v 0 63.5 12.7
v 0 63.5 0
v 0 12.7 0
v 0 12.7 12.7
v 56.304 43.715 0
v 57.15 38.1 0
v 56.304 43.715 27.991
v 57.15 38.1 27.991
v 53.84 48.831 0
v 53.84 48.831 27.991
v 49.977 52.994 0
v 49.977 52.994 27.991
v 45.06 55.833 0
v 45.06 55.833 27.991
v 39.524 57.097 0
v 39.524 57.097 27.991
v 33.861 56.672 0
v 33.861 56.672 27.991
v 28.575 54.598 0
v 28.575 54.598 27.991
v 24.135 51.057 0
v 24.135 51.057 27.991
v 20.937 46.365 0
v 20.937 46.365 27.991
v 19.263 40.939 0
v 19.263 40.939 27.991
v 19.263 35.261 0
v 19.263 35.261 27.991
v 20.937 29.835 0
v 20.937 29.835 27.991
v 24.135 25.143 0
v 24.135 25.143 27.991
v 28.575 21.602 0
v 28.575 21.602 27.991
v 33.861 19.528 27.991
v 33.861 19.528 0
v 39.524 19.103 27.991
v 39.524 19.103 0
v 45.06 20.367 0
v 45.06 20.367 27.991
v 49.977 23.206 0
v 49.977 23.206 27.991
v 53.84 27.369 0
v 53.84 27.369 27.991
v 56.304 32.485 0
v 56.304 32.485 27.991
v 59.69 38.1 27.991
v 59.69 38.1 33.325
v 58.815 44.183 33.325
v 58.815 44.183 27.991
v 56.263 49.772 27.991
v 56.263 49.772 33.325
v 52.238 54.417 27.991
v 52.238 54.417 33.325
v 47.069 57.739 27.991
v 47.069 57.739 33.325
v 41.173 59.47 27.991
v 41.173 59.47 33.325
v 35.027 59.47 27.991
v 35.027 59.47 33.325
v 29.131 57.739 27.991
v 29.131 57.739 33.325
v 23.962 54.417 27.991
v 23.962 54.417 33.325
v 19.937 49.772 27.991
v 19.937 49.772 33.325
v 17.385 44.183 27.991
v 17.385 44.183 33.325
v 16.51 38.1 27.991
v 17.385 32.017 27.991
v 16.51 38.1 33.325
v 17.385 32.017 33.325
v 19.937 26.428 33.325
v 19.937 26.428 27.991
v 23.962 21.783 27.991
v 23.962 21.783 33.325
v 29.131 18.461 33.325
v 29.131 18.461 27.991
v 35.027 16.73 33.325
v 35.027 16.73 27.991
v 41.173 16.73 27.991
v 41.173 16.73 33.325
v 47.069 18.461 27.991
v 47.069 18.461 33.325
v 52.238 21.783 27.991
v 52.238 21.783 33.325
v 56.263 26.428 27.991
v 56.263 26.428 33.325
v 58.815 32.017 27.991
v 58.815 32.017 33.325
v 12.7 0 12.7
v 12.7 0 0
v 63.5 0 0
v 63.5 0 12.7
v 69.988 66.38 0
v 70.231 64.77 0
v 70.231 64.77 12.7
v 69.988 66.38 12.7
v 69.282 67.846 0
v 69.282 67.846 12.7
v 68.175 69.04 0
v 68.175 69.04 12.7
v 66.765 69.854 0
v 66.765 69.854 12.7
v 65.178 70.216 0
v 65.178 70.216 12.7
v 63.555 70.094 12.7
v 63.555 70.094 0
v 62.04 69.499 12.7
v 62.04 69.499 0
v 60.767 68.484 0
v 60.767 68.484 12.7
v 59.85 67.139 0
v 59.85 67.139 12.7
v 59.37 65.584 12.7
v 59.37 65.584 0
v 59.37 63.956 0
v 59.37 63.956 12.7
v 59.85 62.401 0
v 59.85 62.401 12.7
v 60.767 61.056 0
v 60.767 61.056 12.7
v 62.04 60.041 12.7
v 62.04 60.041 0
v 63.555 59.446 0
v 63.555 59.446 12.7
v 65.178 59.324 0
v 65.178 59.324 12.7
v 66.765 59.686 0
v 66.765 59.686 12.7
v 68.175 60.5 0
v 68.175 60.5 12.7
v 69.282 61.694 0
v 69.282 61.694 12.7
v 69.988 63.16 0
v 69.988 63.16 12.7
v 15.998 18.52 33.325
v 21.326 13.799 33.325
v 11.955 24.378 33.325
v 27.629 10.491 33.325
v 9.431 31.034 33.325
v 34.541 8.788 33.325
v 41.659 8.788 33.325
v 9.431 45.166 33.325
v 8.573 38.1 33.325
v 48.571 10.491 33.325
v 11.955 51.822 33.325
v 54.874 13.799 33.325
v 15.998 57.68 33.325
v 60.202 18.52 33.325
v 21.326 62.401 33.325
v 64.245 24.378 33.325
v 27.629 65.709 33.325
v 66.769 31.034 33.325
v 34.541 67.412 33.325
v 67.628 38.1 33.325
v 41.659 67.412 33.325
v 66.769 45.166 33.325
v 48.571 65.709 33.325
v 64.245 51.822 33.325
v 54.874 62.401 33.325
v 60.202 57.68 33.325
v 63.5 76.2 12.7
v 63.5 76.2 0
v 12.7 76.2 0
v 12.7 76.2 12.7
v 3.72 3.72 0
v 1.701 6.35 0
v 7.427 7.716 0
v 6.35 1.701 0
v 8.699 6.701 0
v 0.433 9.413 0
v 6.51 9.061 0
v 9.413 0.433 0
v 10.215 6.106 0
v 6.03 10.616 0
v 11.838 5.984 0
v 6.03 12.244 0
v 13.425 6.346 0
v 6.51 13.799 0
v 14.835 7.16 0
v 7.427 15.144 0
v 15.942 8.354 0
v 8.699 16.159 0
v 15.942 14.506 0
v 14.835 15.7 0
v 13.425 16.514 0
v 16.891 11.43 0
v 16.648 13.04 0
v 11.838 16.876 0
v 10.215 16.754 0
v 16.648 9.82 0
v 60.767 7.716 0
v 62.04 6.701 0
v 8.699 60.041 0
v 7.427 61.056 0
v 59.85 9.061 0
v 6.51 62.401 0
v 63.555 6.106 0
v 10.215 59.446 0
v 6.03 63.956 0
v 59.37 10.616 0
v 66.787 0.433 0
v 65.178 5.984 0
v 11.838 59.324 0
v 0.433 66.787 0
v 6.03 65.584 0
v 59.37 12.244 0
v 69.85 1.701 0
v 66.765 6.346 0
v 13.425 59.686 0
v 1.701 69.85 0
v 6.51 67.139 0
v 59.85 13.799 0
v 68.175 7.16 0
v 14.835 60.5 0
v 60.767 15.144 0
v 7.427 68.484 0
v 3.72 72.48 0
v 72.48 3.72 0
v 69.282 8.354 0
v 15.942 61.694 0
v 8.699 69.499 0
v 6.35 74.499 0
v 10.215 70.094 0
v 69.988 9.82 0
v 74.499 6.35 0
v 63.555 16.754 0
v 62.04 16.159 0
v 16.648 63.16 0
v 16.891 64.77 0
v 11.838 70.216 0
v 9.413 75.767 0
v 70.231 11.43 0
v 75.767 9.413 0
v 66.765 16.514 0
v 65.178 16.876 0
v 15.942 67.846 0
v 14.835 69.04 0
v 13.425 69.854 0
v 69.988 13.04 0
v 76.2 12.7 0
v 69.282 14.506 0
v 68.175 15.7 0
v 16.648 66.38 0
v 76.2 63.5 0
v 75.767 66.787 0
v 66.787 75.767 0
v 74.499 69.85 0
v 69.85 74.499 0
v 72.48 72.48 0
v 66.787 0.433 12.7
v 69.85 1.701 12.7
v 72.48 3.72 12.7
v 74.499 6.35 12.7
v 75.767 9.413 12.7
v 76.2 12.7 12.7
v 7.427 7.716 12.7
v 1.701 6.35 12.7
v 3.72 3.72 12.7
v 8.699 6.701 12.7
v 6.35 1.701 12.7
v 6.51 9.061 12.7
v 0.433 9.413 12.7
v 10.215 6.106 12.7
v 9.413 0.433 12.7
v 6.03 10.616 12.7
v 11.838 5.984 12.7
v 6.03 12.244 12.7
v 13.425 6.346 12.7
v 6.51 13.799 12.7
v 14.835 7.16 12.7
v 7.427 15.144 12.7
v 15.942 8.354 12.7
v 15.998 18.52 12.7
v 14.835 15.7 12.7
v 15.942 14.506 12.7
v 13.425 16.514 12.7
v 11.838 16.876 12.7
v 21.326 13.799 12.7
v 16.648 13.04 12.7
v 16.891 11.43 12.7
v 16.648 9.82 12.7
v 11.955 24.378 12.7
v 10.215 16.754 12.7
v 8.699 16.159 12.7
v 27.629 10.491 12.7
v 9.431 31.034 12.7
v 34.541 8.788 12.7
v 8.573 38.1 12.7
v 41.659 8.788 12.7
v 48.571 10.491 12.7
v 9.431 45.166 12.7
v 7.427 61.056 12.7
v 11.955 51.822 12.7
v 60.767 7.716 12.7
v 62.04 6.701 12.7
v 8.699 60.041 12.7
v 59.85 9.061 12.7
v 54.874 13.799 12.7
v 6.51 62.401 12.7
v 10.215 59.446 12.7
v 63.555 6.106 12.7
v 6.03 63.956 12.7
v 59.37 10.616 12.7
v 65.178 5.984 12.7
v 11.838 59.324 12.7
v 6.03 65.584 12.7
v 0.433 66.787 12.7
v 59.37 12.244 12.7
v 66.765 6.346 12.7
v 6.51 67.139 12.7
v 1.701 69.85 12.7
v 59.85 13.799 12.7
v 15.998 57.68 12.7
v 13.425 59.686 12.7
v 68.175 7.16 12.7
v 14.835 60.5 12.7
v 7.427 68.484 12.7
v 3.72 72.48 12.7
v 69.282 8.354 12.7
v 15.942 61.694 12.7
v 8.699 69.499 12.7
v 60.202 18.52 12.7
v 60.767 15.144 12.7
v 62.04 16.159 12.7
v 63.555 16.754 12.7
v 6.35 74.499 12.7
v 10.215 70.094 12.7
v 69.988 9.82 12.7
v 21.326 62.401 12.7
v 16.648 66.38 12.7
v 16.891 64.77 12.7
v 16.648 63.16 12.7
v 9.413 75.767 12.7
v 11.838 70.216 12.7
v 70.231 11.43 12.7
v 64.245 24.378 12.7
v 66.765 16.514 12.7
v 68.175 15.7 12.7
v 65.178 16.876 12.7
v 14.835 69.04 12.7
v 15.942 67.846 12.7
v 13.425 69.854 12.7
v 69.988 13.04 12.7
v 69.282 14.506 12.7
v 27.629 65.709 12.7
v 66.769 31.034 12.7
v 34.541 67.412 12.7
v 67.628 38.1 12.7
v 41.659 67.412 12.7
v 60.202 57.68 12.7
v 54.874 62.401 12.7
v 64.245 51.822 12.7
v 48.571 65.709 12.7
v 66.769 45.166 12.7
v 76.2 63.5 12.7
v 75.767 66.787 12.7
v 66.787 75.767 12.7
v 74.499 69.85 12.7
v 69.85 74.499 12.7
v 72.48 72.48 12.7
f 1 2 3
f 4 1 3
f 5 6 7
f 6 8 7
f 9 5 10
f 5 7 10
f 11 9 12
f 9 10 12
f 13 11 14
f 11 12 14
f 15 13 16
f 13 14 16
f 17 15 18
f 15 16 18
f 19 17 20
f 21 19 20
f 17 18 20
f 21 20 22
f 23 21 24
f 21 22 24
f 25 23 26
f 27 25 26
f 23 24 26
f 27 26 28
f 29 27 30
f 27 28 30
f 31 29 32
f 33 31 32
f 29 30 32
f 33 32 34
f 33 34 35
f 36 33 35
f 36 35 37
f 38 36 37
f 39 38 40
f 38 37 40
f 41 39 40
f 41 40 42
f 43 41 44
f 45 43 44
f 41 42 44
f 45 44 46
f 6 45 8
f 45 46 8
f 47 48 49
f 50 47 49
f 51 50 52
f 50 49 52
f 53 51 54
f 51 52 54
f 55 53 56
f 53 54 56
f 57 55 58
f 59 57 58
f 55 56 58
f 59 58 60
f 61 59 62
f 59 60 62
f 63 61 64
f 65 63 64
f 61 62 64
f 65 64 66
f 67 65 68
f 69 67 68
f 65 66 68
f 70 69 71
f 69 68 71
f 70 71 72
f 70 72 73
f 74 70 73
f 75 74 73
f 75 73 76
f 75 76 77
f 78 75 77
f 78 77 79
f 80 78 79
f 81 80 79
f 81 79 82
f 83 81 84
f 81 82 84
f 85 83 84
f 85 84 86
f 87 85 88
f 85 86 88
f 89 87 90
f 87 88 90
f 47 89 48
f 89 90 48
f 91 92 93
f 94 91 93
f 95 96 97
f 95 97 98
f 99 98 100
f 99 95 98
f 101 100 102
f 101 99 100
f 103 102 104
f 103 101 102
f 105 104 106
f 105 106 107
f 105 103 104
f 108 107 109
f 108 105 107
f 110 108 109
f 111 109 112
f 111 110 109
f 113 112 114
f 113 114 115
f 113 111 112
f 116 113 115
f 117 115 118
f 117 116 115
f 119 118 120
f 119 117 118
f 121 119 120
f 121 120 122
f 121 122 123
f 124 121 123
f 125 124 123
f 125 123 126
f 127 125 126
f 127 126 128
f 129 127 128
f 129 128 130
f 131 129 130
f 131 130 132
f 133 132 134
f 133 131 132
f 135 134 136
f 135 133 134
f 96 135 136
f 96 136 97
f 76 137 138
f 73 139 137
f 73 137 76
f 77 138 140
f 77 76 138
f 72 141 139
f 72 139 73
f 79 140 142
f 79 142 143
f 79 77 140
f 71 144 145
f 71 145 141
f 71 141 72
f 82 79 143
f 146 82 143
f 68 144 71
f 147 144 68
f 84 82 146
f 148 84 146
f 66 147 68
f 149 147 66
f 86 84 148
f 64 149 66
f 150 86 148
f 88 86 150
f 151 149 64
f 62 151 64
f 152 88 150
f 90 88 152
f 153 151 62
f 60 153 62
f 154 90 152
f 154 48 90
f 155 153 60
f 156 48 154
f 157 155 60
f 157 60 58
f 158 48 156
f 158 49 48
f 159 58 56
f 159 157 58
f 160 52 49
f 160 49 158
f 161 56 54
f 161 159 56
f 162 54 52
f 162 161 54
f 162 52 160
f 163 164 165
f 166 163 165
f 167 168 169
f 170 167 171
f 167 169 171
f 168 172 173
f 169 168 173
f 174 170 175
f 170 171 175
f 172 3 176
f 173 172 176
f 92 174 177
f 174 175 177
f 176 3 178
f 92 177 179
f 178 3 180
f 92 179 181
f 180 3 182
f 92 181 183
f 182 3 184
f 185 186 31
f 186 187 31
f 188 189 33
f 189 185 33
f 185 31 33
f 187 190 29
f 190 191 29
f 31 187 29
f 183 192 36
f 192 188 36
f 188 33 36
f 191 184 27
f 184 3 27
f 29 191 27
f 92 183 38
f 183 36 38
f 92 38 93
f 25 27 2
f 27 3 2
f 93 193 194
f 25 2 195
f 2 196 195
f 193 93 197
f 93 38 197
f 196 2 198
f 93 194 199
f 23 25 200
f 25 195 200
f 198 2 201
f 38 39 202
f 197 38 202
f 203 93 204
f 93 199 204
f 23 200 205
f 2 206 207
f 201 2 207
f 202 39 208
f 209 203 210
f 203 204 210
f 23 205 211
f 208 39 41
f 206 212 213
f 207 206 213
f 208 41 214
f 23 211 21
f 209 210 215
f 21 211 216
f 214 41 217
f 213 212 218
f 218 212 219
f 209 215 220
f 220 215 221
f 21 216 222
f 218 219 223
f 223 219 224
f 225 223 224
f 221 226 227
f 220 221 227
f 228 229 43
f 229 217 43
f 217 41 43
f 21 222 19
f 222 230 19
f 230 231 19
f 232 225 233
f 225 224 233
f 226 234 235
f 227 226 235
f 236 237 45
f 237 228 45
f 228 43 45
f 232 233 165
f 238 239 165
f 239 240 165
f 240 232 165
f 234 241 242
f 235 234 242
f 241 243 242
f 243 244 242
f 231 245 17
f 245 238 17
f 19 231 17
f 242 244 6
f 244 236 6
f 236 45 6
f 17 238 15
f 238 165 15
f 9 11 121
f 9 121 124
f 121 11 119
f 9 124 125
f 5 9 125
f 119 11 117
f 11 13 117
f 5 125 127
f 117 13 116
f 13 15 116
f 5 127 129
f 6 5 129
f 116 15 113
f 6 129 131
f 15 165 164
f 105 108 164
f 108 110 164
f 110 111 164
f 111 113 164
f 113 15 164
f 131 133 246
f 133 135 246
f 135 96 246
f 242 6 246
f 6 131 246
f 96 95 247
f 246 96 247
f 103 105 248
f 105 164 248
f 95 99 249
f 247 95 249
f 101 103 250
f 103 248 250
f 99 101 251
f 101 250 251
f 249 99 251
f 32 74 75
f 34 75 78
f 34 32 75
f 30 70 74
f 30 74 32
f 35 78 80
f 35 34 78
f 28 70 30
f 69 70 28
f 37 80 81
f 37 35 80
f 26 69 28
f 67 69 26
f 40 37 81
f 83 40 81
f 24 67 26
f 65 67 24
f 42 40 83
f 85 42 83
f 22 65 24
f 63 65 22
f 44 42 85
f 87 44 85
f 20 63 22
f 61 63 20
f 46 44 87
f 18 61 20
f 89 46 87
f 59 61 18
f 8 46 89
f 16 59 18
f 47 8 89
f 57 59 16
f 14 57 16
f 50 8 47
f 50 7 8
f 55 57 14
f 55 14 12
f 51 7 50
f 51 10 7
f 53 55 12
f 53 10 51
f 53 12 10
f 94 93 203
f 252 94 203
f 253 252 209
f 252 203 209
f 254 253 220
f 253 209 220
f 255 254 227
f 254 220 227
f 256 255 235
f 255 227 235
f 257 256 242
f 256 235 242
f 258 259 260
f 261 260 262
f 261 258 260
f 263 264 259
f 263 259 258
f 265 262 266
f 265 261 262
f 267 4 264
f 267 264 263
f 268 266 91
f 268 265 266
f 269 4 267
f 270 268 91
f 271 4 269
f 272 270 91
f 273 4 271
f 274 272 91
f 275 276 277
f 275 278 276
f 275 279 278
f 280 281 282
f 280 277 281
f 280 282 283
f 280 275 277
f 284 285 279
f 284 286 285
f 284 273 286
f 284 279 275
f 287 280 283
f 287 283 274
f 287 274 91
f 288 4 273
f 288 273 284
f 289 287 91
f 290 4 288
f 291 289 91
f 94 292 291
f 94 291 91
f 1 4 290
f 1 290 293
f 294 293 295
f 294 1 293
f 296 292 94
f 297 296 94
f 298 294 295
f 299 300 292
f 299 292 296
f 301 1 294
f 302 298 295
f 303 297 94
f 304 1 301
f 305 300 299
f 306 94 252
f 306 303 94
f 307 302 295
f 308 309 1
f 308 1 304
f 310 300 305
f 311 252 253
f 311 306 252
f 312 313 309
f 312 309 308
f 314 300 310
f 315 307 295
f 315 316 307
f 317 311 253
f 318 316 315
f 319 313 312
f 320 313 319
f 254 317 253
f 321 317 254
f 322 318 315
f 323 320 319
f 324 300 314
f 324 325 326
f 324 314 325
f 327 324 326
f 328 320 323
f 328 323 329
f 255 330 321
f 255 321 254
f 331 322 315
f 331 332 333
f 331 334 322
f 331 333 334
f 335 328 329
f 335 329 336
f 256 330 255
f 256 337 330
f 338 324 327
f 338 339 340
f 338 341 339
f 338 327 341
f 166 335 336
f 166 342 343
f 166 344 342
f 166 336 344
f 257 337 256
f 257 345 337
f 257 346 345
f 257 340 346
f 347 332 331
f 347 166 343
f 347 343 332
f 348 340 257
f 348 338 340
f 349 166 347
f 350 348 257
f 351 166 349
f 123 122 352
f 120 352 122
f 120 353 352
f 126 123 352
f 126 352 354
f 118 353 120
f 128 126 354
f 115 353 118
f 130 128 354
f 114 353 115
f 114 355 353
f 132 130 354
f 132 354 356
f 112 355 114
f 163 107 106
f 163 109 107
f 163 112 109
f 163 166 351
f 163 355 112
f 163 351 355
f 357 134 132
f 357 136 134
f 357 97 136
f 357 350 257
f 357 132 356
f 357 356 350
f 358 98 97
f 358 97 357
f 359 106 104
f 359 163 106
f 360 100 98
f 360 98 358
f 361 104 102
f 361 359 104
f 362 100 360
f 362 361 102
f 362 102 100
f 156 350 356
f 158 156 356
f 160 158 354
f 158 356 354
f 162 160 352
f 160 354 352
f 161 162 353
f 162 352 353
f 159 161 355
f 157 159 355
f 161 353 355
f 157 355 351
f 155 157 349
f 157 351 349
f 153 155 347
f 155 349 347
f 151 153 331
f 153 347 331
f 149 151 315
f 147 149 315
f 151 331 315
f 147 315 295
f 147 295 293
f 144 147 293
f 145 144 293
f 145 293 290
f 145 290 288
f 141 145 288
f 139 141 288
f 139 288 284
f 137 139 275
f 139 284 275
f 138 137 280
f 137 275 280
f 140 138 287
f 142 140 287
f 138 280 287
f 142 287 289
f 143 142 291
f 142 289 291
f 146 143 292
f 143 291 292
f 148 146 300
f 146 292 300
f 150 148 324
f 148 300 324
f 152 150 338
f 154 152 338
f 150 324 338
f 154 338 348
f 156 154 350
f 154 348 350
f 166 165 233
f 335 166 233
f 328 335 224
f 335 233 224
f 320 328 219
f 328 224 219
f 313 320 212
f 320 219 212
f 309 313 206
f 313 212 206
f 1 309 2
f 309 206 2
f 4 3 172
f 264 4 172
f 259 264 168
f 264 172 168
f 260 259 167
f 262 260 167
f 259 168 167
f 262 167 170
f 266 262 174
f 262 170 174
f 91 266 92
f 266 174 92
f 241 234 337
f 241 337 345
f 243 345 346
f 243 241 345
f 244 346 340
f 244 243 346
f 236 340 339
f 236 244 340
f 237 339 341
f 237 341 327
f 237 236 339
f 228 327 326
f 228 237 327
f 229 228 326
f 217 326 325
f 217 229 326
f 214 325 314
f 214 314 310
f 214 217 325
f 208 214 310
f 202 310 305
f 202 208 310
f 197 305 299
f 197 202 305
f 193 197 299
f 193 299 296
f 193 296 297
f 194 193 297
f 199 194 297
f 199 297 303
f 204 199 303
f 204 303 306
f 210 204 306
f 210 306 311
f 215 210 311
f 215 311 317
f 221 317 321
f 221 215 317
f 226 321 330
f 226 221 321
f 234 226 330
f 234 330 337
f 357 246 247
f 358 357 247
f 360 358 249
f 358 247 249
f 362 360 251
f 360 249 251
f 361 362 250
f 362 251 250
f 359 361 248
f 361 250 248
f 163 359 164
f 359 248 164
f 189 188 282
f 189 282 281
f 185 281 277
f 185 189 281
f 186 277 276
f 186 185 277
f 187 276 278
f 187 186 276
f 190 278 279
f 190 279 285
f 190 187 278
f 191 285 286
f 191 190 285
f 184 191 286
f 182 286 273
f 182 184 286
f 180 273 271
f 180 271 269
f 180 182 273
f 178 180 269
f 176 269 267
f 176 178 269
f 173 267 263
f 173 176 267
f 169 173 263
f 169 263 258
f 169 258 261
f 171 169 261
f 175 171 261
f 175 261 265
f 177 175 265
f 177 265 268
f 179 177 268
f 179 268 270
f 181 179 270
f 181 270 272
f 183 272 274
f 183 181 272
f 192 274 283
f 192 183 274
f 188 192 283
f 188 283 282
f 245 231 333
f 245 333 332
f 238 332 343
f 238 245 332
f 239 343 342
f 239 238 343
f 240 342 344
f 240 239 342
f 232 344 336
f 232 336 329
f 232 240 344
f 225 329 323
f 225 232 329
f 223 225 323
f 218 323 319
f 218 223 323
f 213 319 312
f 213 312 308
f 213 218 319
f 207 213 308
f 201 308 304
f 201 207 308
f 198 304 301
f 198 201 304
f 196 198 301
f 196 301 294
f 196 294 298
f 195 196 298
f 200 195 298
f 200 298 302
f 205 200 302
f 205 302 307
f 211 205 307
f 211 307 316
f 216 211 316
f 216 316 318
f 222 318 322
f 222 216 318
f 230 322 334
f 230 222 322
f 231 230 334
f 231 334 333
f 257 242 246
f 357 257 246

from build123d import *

# Parameters (mm, degrees)
F0_R     = 5.461
F1_DEPTH = 12.7
F2_R     = 29.5275
F2_R_2   = 19.05
F3_DEPTH = 20.6248
F4_R     = 21.59
F5_DEPTH = 5.334
F6_R     = 19.05
F7_DEPTH = 25.4


with BuildPart() as f1:
    # F0 (on Top) → F1 (new body)
    with BuildSketch(Plane.XY):
        with BuildLine():
            ThreePointArc((0, 12.7), (3.719744, 3.719744), (12.7, 0))
            Line((12.7, 0), (63.5, 0))
            ThreePointArc((63.5, 0), (72.480256, 3.719744), (76.2, 12.7))
            Line((76.2, 12.7), (76.2, 63.5))
            ThreePointArc((76.2, 63.5), (72.480256, 72.480256), (63.5, 76.2))
            Line((63.5, 76.2), (12.7, 76.2))
            ThreePointArc((12.7, 76.2), (3.719744, 72.480256), (0, 63.5))
            Line((0, 63.5), (0, 12.7))
        make_face()
        with Locations((11.43, 11.43)):
            Circle(F0_R, mode=Mode.SUBTRACT)
        with Locations((64.77, 11.43)):
            Circle(F0_R, mode=Mode.SUBTRACT)
        with Locations((11.43, 64.77)):
            Circle(F0_R, mode=Mode.SUBTRACT)
        with Locations((64.77, 64.77)):
            Circle(F0_R, mode=Mode.SUBTRACT)
    extrude(amount=F1_DEPTH)

    # F2 (on face) → F3 (join)
    with BuildSketch(Plane.XY.offset(12.7)):
        with Locations((38.1, 38.1)):
            Circle(F2_R)
        with Locations((38.1, 38.1)):
            Circle(F2_R_2, mode=Mode.SUBTRACT)
    extrude(amount=F3_DEPTH)

    # F4 (on face) → F5 (cut)
    with BuildSketch(Plane.XY.offset(33.3248)):
        with Locations((38.1, 38.1)):
            Circle(F4_R)
    extrude(amount=-F5_DEPTH, mode=Mode.SUBTRACT)

    # F6 (on face) → F7 (cut)
    with BuildSketch(Plane.XY.offset(12.7)):
        with Locations((38.1, 38.1)):
            Circle(F6_R)
    extrude(amount=-F7_DEPTH, mode=Mode.SUBTRACT)


solid = f1.part
